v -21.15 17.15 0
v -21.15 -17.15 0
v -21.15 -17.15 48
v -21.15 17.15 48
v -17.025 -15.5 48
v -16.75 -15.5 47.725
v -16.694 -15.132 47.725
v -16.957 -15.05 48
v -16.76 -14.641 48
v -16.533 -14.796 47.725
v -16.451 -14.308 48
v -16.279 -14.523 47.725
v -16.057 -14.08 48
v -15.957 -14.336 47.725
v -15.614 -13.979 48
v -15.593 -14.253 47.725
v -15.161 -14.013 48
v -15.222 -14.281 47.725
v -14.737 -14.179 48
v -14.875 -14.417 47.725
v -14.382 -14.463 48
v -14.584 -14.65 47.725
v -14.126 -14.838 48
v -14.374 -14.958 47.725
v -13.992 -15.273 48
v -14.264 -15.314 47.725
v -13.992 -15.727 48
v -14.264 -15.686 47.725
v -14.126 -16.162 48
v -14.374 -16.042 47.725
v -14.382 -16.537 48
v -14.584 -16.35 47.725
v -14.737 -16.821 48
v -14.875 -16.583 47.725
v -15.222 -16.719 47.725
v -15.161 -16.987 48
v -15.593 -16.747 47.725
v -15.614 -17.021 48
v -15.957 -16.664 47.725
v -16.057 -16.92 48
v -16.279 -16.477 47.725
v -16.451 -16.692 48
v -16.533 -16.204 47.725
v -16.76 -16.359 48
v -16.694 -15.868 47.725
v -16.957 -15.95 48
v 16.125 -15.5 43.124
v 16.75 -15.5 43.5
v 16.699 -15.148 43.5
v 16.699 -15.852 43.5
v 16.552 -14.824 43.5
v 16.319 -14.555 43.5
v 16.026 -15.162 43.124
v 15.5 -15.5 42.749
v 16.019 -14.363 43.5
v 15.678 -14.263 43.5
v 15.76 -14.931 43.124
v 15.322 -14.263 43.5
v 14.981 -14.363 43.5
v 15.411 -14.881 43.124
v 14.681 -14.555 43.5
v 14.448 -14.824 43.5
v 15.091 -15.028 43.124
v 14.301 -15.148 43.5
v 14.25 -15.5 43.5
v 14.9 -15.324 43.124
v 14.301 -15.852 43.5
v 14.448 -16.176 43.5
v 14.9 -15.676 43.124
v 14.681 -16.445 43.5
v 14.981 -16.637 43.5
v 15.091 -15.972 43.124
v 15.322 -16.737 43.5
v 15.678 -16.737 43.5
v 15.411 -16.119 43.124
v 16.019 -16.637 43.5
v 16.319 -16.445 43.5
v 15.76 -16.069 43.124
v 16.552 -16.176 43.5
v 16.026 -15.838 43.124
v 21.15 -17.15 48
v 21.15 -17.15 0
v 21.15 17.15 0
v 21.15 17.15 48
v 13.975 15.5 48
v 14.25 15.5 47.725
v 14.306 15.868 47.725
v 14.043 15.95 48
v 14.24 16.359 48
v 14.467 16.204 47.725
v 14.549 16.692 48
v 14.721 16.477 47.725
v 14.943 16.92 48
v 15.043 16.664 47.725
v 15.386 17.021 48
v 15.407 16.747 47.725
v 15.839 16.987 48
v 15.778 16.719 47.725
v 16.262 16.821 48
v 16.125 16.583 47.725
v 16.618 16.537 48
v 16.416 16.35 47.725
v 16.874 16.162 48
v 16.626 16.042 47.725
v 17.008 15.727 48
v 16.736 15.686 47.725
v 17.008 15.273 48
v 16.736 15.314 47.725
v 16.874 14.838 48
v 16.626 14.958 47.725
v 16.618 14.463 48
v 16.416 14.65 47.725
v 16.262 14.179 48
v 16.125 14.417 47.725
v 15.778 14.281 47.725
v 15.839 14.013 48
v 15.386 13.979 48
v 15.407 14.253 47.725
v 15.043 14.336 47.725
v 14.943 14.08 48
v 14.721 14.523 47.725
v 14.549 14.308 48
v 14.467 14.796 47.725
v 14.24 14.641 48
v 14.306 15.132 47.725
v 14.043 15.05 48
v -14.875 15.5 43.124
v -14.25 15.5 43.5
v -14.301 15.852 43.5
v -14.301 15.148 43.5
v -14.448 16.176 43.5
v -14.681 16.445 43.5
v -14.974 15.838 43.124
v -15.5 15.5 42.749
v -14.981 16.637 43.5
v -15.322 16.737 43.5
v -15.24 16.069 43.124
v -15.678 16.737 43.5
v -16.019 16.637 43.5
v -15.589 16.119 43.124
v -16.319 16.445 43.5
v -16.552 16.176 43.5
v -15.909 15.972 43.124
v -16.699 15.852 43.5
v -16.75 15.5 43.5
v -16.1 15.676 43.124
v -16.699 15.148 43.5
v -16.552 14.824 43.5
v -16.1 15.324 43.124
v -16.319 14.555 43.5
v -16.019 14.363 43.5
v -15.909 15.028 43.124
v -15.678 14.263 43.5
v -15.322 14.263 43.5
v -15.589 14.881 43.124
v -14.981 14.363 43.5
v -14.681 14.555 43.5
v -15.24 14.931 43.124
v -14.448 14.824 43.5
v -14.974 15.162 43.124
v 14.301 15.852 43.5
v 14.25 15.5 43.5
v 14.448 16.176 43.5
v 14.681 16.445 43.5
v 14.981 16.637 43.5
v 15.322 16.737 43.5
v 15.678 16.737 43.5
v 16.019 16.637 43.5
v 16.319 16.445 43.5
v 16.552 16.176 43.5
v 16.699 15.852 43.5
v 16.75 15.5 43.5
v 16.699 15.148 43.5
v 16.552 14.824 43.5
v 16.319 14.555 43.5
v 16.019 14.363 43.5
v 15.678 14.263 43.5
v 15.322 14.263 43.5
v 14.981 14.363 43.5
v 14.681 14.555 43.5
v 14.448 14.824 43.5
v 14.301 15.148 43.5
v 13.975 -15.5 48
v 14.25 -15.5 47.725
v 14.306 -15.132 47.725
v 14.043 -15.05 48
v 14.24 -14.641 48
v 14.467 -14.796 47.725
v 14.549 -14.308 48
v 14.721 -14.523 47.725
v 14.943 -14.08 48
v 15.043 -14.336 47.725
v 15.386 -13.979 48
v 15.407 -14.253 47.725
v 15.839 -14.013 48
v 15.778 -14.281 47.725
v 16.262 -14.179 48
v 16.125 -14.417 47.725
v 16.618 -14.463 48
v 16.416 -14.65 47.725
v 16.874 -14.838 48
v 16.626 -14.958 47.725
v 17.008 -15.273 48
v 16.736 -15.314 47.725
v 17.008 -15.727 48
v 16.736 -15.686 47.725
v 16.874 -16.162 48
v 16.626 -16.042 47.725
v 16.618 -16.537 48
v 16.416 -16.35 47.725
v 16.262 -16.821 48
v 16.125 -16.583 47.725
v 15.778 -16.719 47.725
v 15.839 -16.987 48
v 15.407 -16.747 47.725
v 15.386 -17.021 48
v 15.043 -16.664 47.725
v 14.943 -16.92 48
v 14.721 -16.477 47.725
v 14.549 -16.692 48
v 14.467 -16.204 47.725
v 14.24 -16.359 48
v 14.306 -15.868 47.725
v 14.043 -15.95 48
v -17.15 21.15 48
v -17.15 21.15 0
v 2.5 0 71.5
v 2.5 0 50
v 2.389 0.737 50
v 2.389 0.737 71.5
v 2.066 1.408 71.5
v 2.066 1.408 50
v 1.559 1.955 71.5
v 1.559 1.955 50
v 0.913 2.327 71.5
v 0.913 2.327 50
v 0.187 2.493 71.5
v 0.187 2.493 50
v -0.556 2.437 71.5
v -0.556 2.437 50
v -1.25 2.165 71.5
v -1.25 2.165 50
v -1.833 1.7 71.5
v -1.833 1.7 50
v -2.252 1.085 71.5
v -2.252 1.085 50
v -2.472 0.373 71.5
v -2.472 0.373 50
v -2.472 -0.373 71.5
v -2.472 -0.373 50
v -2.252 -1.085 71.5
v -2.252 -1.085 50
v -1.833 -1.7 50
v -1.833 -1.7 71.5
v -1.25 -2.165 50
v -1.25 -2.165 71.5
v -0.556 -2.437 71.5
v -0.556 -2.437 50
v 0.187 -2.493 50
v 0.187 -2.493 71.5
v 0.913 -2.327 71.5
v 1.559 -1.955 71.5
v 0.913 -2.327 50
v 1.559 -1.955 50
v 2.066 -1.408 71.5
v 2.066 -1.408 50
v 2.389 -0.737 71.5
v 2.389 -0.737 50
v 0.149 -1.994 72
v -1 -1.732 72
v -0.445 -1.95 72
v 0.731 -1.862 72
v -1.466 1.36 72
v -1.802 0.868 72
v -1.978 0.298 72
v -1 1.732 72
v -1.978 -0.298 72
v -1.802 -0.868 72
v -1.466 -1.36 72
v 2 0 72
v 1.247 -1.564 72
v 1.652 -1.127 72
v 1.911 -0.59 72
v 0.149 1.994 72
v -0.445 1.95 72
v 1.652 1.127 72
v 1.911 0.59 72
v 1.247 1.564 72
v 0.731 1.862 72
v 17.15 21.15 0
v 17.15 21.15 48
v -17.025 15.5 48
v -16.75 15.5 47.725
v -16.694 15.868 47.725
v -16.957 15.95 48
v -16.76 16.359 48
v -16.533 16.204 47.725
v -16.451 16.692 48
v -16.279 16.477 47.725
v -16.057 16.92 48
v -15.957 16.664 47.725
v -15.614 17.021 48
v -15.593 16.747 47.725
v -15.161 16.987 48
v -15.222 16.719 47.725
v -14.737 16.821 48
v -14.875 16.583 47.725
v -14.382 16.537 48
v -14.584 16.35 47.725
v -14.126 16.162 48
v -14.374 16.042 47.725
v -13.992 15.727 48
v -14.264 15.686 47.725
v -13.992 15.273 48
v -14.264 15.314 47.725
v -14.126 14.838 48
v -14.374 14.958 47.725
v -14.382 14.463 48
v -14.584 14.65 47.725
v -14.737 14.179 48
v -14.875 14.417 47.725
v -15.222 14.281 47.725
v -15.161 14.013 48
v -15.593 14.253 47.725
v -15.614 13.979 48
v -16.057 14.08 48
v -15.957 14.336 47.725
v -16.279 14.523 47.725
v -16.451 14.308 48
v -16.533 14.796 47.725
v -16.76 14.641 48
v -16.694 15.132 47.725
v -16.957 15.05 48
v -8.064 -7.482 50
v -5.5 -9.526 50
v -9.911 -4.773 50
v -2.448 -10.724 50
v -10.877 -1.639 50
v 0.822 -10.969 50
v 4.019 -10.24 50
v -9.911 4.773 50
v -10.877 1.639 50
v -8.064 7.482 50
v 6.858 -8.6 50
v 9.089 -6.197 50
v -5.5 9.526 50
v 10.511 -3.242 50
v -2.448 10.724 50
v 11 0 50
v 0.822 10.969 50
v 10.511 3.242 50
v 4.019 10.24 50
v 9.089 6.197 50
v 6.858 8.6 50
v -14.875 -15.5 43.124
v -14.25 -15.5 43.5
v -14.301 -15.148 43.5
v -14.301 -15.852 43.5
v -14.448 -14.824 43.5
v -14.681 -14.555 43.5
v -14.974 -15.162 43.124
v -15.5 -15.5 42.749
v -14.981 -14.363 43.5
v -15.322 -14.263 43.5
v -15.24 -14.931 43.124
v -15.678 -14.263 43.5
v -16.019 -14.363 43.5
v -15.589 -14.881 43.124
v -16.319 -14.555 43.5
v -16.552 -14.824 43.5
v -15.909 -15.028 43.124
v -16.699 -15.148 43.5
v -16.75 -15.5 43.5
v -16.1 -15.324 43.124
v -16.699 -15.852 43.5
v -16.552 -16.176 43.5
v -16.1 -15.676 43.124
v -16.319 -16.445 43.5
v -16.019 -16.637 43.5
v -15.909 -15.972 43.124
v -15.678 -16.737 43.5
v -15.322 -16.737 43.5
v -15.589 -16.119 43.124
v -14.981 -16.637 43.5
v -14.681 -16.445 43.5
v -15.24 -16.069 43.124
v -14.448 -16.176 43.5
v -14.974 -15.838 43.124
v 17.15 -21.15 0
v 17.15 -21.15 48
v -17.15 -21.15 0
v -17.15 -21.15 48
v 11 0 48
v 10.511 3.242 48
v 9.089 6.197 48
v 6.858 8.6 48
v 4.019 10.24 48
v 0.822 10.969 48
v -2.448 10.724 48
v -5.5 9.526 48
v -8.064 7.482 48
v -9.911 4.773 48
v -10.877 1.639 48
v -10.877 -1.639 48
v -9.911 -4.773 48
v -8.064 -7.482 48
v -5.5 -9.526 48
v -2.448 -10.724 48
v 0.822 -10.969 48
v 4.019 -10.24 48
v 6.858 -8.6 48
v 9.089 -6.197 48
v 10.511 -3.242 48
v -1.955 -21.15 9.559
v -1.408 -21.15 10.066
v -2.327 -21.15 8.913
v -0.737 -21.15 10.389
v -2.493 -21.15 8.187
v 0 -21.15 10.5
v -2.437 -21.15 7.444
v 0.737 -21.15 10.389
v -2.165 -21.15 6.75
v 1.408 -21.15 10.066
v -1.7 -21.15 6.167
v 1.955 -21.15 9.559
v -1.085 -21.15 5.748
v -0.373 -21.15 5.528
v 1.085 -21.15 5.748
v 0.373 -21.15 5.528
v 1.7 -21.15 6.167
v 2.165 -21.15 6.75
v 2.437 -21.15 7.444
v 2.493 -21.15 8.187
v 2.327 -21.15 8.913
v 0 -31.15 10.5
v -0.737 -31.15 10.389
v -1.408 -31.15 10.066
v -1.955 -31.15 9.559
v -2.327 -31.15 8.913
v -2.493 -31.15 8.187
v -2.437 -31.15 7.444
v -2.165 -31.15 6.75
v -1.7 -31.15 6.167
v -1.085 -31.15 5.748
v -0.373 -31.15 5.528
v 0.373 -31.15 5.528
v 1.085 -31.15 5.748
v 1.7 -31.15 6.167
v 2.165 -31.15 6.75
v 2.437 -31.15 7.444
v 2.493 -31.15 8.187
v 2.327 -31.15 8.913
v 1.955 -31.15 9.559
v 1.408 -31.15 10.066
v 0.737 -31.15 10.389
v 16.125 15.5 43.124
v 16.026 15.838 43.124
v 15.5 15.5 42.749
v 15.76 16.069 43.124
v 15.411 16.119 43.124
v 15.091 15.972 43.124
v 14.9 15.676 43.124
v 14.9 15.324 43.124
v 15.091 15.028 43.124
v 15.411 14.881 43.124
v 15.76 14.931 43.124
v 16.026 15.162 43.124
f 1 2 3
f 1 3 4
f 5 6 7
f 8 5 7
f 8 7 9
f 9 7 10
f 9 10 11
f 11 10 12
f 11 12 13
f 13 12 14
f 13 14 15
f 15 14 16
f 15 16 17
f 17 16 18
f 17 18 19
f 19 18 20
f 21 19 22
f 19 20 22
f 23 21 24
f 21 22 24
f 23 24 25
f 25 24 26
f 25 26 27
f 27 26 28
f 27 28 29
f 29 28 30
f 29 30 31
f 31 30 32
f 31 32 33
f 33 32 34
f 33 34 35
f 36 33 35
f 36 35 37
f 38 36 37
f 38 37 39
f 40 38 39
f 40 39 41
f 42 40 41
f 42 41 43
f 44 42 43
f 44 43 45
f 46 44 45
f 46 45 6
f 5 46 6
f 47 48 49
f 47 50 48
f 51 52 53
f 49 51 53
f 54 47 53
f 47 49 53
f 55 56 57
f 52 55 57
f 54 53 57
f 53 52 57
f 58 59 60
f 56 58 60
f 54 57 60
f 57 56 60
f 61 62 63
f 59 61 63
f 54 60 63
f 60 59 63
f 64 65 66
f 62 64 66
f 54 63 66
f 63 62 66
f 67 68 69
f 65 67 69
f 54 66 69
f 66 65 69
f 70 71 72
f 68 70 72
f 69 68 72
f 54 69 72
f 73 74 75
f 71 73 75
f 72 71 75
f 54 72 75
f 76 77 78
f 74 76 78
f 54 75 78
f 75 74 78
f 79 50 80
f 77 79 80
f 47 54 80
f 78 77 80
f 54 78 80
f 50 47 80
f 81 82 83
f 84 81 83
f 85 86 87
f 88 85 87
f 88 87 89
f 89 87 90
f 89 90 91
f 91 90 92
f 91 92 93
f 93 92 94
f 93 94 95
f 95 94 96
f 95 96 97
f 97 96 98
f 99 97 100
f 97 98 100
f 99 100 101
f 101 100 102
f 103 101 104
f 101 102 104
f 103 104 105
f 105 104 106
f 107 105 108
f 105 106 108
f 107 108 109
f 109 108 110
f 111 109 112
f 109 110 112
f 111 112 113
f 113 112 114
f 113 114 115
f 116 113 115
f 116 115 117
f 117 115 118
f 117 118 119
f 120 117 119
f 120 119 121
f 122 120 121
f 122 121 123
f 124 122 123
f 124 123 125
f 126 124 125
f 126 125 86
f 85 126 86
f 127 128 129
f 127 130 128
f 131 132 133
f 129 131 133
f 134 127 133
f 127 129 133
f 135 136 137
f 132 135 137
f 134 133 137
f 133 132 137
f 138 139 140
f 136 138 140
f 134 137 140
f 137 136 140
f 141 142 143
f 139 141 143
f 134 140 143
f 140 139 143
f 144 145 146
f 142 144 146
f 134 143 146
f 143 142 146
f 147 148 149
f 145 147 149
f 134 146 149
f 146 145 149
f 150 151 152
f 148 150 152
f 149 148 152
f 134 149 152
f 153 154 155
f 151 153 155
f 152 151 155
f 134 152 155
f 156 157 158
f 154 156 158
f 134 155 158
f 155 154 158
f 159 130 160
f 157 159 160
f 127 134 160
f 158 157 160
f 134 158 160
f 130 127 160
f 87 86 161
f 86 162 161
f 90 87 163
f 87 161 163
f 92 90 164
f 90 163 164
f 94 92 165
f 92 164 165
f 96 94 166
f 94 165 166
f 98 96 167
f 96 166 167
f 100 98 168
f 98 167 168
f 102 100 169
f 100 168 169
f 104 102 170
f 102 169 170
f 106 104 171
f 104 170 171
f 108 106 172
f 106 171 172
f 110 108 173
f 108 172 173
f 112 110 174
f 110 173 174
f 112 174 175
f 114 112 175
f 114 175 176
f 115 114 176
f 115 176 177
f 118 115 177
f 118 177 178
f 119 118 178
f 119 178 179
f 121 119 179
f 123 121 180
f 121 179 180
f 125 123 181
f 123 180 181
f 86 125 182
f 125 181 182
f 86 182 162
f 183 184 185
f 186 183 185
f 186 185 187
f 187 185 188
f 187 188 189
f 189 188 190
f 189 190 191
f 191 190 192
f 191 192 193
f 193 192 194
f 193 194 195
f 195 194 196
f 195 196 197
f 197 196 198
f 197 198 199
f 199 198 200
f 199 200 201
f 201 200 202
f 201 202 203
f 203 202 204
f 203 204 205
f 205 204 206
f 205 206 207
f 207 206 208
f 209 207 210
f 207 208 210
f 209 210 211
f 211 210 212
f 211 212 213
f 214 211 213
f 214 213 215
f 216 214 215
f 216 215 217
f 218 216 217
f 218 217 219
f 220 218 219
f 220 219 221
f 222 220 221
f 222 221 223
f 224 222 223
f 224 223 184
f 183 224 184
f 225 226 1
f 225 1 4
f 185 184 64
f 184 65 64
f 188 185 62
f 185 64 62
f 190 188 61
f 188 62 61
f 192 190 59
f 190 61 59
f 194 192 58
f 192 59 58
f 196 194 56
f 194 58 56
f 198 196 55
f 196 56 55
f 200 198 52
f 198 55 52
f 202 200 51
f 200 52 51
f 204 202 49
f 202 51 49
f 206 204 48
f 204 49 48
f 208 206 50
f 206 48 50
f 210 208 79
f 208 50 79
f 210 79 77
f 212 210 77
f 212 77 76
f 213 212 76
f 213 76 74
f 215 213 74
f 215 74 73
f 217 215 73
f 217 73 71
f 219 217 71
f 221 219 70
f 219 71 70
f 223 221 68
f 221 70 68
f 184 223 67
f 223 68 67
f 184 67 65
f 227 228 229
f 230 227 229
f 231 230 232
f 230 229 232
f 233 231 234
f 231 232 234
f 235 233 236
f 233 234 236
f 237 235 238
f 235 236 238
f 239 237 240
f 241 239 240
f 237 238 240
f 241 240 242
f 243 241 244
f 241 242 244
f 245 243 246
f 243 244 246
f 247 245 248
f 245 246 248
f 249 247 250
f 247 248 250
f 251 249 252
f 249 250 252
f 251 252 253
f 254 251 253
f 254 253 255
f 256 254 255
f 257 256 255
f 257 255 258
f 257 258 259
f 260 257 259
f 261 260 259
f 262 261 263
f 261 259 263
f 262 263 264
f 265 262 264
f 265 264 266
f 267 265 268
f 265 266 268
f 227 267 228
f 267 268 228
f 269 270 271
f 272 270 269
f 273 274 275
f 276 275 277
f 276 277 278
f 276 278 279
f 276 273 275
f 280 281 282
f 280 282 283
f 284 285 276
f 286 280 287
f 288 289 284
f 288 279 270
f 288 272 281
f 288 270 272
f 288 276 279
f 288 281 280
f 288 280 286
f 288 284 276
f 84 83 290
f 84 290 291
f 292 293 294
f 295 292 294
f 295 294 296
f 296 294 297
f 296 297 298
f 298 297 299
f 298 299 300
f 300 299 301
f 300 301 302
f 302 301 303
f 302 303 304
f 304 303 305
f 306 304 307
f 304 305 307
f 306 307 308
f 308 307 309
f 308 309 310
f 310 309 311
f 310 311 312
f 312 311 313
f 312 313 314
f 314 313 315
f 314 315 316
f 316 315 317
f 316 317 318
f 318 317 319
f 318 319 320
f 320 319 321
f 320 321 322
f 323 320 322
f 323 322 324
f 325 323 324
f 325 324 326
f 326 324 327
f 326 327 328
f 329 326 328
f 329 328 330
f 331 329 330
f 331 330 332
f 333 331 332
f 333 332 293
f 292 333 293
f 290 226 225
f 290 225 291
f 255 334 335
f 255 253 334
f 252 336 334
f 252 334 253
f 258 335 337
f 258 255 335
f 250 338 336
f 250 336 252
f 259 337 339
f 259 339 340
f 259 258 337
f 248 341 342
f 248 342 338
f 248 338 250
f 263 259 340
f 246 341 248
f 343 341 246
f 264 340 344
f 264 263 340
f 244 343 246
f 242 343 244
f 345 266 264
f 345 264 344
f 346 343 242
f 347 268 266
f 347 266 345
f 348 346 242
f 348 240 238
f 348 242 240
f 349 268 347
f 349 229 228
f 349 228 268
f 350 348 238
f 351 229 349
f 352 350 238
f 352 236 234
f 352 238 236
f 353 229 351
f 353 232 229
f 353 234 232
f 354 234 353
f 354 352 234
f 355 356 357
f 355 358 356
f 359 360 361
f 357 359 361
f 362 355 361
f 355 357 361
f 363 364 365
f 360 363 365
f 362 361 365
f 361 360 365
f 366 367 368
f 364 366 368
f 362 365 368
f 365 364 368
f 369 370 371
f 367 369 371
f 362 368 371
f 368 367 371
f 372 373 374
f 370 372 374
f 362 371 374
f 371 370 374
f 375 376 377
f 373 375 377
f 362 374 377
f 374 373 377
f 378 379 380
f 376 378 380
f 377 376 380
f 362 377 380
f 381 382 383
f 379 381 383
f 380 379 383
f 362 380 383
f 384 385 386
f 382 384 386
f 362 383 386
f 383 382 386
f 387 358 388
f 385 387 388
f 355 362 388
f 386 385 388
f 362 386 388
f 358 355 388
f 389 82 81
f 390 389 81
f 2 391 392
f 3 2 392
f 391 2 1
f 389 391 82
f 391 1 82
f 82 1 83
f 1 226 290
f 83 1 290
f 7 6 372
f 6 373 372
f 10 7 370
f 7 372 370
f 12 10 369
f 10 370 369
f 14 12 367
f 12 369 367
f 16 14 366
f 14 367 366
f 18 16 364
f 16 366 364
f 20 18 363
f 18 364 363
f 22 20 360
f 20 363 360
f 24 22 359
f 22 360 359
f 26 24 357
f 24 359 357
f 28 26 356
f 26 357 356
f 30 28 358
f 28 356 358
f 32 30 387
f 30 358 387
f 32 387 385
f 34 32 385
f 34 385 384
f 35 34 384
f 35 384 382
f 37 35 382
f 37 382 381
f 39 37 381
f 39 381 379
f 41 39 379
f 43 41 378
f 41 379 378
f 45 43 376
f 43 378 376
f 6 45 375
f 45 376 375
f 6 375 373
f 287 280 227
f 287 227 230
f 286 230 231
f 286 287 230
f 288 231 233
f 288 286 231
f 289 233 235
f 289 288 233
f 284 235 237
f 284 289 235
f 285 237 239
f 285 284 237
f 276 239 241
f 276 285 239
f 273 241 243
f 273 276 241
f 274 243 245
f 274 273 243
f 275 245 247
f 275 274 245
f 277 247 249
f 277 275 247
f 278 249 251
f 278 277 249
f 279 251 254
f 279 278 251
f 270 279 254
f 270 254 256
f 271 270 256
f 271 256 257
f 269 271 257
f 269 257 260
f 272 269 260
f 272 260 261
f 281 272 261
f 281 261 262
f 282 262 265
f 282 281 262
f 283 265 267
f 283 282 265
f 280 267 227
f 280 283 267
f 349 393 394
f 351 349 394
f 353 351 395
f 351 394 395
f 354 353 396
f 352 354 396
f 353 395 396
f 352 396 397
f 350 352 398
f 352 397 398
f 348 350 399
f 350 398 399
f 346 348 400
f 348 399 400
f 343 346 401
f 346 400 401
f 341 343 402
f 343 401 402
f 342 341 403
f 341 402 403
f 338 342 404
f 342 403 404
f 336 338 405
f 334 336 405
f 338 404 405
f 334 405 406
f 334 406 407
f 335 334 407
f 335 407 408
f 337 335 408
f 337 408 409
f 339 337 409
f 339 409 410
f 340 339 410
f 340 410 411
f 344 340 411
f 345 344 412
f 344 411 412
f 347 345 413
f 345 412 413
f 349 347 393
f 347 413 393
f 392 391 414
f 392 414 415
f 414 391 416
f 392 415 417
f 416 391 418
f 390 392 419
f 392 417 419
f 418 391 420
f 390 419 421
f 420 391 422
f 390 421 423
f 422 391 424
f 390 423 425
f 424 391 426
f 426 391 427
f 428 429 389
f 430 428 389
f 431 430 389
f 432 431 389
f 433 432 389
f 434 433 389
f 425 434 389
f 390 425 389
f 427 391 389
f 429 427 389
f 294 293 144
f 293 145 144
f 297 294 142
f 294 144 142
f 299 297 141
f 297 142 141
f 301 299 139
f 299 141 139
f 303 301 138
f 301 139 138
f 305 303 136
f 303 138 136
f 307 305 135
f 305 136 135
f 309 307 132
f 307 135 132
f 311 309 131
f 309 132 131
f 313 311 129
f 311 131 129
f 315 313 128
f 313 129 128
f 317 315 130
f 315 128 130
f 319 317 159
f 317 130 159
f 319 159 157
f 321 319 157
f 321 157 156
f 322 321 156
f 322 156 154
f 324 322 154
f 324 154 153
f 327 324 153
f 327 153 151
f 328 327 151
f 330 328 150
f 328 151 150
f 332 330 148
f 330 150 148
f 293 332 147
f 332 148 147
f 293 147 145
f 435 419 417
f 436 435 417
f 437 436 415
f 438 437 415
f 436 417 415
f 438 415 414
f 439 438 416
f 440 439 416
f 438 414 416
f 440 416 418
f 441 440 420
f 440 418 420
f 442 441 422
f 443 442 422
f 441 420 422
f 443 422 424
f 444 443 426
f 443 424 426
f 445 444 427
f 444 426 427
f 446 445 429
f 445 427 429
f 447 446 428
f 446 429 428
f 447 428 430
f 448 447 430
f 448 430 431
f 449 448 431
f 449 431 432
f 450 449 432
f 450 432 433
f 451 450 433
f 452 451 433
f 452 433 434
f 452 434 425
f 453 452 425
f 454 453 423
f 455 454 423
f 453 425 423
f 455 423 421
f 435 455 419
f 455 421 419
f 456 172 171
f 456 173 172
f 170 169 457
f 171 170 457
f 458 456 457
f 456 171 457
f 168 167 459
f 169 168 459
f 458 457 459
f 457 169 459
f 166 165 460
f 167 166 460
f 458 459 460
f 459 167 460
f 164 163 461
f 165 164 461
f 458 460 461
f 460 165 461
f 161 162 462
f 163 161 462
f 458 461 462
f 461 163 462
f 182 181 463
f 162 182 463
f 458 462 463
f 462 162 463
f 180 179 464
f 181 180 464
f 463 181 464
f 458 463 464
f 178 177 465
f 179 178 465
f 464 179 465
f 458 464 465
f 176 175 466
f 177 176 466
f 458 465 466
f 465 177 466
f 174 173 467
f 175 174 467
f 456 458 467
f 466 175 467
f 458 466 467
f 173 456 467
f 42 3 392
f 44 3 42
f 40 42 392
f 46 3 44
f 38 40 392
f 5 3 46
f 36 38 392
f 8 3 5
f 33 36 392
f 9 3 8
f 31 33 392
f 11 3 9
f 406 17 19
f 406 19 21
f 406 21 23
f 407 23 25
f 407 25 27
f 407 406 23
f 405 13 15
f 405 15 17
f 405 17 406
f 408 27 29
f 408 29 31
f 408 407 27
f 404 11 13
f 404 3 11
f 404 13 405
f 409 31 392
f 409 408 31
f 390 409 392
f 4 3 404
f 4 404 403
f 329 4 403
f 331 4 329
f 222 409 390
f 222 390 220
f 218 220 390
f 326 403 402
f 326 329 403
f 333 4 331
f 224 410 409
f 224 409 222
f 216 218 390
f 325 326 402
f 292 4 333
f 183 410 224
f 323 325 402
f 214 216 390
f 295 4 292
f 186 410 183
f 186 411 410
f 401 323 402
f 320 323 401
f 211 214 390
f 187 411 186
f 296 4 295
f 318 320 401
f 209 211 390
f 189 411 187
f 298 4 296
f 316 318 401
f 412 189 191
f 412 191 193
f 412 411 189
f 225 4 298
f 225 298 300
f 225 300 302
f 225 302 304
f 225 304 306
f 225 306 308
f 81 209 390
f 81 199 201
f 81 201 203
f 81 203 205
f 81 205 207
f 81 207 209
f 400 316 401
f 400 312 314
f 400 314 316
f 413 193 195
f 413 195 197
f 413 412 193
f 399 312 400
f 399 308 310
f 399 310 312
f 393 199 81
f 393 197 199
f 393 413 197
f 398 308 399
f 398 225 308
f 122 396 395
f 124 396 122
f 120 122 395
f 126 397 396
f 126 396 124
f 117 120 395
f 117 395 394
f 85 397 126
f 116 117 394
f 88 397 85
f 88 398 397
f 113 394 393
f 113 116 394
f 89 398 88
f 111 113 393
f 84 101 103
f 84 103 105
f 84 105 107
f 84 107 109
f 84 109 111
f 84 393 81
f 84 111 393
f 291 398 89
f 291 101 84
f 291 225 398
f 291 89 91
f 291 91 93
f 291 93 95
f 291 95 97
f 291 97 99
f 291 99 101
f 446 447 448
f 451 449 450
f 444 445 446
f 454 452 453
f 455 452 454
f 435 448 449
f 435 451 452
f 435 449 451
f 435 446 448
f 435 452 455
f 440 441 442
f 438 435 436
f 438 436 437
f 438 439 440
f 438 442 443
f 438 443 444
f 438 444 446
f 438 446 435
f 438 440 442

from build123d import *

# Parameters (mm, degrees)
SKETCH1_W                   = 42.3
SKETCH1_H                   = 42.3
BOSS_EXTRUDE1_DEPTH         = 48
SKETCH2_R                   = 11
BOSS_EXTRUDE2_DEPTH         = 2
SKETCH3_R                   = 2.5
BOSS_EXTRUDE3_DEPTH         = 22
CHAMFER1_SIZE               = 0.5
CHAMFER2_SIZE               = 4
M3_TAPPED_HOLE1_D           = 2.5
M3_TAPPED_HOLE1_DEPTH       = 4.5
M3_TAPPED_HOLE1_CSINK_D     = 3.05
M3_TAPPED_HOLE1_CSINK_ANGLE = 90
M3_TAPPED_HOLE1_TIP         = 0.751075774
SKETCH5_R                   = 2.5
BOSS_EXTRUDE4_DEPTH         = 10


with BuildPart() as part:
    # Sketch1 → Boss-Extrude1 (new body)
    with BuildSketch(Plane.XY):
        Rectangle(SKETCH1_W, SKETCH1_H)
    extrude(amount=BOSS_EXTRUDE1_DEPTH)

    # Sketch2 → Boss-Extrude2 (add)
    with BuildSketch(Plane.XY.offset(48)):
        Circle(SKETCH2_R)
    extrude(amount=BOSS_EXTRUDE2_DEPTH)

    # Sketch3 → Boss-Extrude3 (add)
    with BuildSketch(Plane.XY.offset(50)):
        Circle(SKETCH3_R)
    extrude(amount=BOSS_EXTRUDE3_DEPTH)

    # Chamfer1
    chamfer1_edges = [part.edges().sort_by_distance(p)[0] for p in [
        (-2.5, 0, 72),
    ]]
    chamfer(chamfer1_edges, length=CHAMFER1_SIZE)

    # Chamfer2
    chamfer2_edges = [part.edges().sort_by_distance(p)[0] for p in [
        (-21.15, 21.15, 24),
        (21.15, 21.15, 24),
        (21.15, -21.15, 24),
        (-21.15, -21.15, 24),
    ]]
    chamfer(chamfer2_edges, length=CHAMFER2_SIZE)

    # M3 Tapped Hole1
    with Locations(Plane(origin=(-15.5, 15.5, 48), x_dir=(1, 0, 0), z_dir=(0, 0, 1))):
        with Locations((0, 0), (31, 0), (31, -31), (0, -31)):
            CounterSinkHole(M3_TAPPED_HOLE1_D / 2, M3_TAPPED_HOLE1_CSINK_D / 2, depth=M3_TAPPED_HOLE1_DEPTH, counter_sink_angle=M3_TAPPED_HOLE1_CSINK_ANGLE)
            with Locations((0, 0, -(M3_TAPPED_HOLE1_DEPTH + M3_TAPPED_HOLE1_TIP / 2))):  # 118° drill point
                Cone(0, M3_TAPPED_HOLE1_D / 2, M3_TAPPED_HOLE1_TIP, mode=Mode.SUBTRACT)

    # Sketch5 → Boss-Extrude4 (add)
    with BuildSketch(Plane.XZ.offset(21.15)):
        with Locations(Location((0, 8, 0), (0, 0, 90))):
            Circle(SKETCH5_R)
    extrude(amount=BOSS_EXTRUDE4_DEPTH)


solid = part.part
